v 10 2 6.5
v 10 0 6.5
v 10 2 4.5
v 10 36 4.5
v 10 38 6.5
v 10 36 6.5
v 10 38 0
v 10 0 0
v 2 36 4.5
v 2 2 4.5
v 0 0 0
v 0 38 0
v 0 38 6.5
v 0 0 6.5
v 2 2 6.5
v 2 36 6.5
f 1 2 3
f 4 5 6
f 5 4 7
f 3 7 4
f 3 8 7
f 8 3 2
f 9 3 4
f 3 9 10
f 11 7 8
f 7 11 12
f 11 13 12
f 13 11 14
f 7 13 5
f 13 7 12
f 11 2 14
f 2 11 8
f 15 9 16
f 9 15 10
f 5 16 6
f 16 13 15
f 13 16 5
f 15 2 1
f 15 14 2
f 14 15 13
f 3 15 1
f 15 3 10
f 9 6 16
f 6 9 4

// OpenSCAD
jig_width = 10;
hinge_length = 34;
frame_lip = 4;
base_thickness = 3;
leaf_offset = 1.5;
jig_thickness = base_thickness + leaf_offset;
raised_edge_height = 2;

total_length = hinge_length + frame_lip;

union() {
  cube([jig_width, total_length, jig_thickness]);
  cube([2, total_length, jig_thickness + raised_edge_height]);
  cube([jig_width, 2, jig_thickness + raised_edge_height]);
  translate([0, total_length - 2, 0])
    cube([jig_width, 2, jig_thickness + raised_edge_height]);
}
